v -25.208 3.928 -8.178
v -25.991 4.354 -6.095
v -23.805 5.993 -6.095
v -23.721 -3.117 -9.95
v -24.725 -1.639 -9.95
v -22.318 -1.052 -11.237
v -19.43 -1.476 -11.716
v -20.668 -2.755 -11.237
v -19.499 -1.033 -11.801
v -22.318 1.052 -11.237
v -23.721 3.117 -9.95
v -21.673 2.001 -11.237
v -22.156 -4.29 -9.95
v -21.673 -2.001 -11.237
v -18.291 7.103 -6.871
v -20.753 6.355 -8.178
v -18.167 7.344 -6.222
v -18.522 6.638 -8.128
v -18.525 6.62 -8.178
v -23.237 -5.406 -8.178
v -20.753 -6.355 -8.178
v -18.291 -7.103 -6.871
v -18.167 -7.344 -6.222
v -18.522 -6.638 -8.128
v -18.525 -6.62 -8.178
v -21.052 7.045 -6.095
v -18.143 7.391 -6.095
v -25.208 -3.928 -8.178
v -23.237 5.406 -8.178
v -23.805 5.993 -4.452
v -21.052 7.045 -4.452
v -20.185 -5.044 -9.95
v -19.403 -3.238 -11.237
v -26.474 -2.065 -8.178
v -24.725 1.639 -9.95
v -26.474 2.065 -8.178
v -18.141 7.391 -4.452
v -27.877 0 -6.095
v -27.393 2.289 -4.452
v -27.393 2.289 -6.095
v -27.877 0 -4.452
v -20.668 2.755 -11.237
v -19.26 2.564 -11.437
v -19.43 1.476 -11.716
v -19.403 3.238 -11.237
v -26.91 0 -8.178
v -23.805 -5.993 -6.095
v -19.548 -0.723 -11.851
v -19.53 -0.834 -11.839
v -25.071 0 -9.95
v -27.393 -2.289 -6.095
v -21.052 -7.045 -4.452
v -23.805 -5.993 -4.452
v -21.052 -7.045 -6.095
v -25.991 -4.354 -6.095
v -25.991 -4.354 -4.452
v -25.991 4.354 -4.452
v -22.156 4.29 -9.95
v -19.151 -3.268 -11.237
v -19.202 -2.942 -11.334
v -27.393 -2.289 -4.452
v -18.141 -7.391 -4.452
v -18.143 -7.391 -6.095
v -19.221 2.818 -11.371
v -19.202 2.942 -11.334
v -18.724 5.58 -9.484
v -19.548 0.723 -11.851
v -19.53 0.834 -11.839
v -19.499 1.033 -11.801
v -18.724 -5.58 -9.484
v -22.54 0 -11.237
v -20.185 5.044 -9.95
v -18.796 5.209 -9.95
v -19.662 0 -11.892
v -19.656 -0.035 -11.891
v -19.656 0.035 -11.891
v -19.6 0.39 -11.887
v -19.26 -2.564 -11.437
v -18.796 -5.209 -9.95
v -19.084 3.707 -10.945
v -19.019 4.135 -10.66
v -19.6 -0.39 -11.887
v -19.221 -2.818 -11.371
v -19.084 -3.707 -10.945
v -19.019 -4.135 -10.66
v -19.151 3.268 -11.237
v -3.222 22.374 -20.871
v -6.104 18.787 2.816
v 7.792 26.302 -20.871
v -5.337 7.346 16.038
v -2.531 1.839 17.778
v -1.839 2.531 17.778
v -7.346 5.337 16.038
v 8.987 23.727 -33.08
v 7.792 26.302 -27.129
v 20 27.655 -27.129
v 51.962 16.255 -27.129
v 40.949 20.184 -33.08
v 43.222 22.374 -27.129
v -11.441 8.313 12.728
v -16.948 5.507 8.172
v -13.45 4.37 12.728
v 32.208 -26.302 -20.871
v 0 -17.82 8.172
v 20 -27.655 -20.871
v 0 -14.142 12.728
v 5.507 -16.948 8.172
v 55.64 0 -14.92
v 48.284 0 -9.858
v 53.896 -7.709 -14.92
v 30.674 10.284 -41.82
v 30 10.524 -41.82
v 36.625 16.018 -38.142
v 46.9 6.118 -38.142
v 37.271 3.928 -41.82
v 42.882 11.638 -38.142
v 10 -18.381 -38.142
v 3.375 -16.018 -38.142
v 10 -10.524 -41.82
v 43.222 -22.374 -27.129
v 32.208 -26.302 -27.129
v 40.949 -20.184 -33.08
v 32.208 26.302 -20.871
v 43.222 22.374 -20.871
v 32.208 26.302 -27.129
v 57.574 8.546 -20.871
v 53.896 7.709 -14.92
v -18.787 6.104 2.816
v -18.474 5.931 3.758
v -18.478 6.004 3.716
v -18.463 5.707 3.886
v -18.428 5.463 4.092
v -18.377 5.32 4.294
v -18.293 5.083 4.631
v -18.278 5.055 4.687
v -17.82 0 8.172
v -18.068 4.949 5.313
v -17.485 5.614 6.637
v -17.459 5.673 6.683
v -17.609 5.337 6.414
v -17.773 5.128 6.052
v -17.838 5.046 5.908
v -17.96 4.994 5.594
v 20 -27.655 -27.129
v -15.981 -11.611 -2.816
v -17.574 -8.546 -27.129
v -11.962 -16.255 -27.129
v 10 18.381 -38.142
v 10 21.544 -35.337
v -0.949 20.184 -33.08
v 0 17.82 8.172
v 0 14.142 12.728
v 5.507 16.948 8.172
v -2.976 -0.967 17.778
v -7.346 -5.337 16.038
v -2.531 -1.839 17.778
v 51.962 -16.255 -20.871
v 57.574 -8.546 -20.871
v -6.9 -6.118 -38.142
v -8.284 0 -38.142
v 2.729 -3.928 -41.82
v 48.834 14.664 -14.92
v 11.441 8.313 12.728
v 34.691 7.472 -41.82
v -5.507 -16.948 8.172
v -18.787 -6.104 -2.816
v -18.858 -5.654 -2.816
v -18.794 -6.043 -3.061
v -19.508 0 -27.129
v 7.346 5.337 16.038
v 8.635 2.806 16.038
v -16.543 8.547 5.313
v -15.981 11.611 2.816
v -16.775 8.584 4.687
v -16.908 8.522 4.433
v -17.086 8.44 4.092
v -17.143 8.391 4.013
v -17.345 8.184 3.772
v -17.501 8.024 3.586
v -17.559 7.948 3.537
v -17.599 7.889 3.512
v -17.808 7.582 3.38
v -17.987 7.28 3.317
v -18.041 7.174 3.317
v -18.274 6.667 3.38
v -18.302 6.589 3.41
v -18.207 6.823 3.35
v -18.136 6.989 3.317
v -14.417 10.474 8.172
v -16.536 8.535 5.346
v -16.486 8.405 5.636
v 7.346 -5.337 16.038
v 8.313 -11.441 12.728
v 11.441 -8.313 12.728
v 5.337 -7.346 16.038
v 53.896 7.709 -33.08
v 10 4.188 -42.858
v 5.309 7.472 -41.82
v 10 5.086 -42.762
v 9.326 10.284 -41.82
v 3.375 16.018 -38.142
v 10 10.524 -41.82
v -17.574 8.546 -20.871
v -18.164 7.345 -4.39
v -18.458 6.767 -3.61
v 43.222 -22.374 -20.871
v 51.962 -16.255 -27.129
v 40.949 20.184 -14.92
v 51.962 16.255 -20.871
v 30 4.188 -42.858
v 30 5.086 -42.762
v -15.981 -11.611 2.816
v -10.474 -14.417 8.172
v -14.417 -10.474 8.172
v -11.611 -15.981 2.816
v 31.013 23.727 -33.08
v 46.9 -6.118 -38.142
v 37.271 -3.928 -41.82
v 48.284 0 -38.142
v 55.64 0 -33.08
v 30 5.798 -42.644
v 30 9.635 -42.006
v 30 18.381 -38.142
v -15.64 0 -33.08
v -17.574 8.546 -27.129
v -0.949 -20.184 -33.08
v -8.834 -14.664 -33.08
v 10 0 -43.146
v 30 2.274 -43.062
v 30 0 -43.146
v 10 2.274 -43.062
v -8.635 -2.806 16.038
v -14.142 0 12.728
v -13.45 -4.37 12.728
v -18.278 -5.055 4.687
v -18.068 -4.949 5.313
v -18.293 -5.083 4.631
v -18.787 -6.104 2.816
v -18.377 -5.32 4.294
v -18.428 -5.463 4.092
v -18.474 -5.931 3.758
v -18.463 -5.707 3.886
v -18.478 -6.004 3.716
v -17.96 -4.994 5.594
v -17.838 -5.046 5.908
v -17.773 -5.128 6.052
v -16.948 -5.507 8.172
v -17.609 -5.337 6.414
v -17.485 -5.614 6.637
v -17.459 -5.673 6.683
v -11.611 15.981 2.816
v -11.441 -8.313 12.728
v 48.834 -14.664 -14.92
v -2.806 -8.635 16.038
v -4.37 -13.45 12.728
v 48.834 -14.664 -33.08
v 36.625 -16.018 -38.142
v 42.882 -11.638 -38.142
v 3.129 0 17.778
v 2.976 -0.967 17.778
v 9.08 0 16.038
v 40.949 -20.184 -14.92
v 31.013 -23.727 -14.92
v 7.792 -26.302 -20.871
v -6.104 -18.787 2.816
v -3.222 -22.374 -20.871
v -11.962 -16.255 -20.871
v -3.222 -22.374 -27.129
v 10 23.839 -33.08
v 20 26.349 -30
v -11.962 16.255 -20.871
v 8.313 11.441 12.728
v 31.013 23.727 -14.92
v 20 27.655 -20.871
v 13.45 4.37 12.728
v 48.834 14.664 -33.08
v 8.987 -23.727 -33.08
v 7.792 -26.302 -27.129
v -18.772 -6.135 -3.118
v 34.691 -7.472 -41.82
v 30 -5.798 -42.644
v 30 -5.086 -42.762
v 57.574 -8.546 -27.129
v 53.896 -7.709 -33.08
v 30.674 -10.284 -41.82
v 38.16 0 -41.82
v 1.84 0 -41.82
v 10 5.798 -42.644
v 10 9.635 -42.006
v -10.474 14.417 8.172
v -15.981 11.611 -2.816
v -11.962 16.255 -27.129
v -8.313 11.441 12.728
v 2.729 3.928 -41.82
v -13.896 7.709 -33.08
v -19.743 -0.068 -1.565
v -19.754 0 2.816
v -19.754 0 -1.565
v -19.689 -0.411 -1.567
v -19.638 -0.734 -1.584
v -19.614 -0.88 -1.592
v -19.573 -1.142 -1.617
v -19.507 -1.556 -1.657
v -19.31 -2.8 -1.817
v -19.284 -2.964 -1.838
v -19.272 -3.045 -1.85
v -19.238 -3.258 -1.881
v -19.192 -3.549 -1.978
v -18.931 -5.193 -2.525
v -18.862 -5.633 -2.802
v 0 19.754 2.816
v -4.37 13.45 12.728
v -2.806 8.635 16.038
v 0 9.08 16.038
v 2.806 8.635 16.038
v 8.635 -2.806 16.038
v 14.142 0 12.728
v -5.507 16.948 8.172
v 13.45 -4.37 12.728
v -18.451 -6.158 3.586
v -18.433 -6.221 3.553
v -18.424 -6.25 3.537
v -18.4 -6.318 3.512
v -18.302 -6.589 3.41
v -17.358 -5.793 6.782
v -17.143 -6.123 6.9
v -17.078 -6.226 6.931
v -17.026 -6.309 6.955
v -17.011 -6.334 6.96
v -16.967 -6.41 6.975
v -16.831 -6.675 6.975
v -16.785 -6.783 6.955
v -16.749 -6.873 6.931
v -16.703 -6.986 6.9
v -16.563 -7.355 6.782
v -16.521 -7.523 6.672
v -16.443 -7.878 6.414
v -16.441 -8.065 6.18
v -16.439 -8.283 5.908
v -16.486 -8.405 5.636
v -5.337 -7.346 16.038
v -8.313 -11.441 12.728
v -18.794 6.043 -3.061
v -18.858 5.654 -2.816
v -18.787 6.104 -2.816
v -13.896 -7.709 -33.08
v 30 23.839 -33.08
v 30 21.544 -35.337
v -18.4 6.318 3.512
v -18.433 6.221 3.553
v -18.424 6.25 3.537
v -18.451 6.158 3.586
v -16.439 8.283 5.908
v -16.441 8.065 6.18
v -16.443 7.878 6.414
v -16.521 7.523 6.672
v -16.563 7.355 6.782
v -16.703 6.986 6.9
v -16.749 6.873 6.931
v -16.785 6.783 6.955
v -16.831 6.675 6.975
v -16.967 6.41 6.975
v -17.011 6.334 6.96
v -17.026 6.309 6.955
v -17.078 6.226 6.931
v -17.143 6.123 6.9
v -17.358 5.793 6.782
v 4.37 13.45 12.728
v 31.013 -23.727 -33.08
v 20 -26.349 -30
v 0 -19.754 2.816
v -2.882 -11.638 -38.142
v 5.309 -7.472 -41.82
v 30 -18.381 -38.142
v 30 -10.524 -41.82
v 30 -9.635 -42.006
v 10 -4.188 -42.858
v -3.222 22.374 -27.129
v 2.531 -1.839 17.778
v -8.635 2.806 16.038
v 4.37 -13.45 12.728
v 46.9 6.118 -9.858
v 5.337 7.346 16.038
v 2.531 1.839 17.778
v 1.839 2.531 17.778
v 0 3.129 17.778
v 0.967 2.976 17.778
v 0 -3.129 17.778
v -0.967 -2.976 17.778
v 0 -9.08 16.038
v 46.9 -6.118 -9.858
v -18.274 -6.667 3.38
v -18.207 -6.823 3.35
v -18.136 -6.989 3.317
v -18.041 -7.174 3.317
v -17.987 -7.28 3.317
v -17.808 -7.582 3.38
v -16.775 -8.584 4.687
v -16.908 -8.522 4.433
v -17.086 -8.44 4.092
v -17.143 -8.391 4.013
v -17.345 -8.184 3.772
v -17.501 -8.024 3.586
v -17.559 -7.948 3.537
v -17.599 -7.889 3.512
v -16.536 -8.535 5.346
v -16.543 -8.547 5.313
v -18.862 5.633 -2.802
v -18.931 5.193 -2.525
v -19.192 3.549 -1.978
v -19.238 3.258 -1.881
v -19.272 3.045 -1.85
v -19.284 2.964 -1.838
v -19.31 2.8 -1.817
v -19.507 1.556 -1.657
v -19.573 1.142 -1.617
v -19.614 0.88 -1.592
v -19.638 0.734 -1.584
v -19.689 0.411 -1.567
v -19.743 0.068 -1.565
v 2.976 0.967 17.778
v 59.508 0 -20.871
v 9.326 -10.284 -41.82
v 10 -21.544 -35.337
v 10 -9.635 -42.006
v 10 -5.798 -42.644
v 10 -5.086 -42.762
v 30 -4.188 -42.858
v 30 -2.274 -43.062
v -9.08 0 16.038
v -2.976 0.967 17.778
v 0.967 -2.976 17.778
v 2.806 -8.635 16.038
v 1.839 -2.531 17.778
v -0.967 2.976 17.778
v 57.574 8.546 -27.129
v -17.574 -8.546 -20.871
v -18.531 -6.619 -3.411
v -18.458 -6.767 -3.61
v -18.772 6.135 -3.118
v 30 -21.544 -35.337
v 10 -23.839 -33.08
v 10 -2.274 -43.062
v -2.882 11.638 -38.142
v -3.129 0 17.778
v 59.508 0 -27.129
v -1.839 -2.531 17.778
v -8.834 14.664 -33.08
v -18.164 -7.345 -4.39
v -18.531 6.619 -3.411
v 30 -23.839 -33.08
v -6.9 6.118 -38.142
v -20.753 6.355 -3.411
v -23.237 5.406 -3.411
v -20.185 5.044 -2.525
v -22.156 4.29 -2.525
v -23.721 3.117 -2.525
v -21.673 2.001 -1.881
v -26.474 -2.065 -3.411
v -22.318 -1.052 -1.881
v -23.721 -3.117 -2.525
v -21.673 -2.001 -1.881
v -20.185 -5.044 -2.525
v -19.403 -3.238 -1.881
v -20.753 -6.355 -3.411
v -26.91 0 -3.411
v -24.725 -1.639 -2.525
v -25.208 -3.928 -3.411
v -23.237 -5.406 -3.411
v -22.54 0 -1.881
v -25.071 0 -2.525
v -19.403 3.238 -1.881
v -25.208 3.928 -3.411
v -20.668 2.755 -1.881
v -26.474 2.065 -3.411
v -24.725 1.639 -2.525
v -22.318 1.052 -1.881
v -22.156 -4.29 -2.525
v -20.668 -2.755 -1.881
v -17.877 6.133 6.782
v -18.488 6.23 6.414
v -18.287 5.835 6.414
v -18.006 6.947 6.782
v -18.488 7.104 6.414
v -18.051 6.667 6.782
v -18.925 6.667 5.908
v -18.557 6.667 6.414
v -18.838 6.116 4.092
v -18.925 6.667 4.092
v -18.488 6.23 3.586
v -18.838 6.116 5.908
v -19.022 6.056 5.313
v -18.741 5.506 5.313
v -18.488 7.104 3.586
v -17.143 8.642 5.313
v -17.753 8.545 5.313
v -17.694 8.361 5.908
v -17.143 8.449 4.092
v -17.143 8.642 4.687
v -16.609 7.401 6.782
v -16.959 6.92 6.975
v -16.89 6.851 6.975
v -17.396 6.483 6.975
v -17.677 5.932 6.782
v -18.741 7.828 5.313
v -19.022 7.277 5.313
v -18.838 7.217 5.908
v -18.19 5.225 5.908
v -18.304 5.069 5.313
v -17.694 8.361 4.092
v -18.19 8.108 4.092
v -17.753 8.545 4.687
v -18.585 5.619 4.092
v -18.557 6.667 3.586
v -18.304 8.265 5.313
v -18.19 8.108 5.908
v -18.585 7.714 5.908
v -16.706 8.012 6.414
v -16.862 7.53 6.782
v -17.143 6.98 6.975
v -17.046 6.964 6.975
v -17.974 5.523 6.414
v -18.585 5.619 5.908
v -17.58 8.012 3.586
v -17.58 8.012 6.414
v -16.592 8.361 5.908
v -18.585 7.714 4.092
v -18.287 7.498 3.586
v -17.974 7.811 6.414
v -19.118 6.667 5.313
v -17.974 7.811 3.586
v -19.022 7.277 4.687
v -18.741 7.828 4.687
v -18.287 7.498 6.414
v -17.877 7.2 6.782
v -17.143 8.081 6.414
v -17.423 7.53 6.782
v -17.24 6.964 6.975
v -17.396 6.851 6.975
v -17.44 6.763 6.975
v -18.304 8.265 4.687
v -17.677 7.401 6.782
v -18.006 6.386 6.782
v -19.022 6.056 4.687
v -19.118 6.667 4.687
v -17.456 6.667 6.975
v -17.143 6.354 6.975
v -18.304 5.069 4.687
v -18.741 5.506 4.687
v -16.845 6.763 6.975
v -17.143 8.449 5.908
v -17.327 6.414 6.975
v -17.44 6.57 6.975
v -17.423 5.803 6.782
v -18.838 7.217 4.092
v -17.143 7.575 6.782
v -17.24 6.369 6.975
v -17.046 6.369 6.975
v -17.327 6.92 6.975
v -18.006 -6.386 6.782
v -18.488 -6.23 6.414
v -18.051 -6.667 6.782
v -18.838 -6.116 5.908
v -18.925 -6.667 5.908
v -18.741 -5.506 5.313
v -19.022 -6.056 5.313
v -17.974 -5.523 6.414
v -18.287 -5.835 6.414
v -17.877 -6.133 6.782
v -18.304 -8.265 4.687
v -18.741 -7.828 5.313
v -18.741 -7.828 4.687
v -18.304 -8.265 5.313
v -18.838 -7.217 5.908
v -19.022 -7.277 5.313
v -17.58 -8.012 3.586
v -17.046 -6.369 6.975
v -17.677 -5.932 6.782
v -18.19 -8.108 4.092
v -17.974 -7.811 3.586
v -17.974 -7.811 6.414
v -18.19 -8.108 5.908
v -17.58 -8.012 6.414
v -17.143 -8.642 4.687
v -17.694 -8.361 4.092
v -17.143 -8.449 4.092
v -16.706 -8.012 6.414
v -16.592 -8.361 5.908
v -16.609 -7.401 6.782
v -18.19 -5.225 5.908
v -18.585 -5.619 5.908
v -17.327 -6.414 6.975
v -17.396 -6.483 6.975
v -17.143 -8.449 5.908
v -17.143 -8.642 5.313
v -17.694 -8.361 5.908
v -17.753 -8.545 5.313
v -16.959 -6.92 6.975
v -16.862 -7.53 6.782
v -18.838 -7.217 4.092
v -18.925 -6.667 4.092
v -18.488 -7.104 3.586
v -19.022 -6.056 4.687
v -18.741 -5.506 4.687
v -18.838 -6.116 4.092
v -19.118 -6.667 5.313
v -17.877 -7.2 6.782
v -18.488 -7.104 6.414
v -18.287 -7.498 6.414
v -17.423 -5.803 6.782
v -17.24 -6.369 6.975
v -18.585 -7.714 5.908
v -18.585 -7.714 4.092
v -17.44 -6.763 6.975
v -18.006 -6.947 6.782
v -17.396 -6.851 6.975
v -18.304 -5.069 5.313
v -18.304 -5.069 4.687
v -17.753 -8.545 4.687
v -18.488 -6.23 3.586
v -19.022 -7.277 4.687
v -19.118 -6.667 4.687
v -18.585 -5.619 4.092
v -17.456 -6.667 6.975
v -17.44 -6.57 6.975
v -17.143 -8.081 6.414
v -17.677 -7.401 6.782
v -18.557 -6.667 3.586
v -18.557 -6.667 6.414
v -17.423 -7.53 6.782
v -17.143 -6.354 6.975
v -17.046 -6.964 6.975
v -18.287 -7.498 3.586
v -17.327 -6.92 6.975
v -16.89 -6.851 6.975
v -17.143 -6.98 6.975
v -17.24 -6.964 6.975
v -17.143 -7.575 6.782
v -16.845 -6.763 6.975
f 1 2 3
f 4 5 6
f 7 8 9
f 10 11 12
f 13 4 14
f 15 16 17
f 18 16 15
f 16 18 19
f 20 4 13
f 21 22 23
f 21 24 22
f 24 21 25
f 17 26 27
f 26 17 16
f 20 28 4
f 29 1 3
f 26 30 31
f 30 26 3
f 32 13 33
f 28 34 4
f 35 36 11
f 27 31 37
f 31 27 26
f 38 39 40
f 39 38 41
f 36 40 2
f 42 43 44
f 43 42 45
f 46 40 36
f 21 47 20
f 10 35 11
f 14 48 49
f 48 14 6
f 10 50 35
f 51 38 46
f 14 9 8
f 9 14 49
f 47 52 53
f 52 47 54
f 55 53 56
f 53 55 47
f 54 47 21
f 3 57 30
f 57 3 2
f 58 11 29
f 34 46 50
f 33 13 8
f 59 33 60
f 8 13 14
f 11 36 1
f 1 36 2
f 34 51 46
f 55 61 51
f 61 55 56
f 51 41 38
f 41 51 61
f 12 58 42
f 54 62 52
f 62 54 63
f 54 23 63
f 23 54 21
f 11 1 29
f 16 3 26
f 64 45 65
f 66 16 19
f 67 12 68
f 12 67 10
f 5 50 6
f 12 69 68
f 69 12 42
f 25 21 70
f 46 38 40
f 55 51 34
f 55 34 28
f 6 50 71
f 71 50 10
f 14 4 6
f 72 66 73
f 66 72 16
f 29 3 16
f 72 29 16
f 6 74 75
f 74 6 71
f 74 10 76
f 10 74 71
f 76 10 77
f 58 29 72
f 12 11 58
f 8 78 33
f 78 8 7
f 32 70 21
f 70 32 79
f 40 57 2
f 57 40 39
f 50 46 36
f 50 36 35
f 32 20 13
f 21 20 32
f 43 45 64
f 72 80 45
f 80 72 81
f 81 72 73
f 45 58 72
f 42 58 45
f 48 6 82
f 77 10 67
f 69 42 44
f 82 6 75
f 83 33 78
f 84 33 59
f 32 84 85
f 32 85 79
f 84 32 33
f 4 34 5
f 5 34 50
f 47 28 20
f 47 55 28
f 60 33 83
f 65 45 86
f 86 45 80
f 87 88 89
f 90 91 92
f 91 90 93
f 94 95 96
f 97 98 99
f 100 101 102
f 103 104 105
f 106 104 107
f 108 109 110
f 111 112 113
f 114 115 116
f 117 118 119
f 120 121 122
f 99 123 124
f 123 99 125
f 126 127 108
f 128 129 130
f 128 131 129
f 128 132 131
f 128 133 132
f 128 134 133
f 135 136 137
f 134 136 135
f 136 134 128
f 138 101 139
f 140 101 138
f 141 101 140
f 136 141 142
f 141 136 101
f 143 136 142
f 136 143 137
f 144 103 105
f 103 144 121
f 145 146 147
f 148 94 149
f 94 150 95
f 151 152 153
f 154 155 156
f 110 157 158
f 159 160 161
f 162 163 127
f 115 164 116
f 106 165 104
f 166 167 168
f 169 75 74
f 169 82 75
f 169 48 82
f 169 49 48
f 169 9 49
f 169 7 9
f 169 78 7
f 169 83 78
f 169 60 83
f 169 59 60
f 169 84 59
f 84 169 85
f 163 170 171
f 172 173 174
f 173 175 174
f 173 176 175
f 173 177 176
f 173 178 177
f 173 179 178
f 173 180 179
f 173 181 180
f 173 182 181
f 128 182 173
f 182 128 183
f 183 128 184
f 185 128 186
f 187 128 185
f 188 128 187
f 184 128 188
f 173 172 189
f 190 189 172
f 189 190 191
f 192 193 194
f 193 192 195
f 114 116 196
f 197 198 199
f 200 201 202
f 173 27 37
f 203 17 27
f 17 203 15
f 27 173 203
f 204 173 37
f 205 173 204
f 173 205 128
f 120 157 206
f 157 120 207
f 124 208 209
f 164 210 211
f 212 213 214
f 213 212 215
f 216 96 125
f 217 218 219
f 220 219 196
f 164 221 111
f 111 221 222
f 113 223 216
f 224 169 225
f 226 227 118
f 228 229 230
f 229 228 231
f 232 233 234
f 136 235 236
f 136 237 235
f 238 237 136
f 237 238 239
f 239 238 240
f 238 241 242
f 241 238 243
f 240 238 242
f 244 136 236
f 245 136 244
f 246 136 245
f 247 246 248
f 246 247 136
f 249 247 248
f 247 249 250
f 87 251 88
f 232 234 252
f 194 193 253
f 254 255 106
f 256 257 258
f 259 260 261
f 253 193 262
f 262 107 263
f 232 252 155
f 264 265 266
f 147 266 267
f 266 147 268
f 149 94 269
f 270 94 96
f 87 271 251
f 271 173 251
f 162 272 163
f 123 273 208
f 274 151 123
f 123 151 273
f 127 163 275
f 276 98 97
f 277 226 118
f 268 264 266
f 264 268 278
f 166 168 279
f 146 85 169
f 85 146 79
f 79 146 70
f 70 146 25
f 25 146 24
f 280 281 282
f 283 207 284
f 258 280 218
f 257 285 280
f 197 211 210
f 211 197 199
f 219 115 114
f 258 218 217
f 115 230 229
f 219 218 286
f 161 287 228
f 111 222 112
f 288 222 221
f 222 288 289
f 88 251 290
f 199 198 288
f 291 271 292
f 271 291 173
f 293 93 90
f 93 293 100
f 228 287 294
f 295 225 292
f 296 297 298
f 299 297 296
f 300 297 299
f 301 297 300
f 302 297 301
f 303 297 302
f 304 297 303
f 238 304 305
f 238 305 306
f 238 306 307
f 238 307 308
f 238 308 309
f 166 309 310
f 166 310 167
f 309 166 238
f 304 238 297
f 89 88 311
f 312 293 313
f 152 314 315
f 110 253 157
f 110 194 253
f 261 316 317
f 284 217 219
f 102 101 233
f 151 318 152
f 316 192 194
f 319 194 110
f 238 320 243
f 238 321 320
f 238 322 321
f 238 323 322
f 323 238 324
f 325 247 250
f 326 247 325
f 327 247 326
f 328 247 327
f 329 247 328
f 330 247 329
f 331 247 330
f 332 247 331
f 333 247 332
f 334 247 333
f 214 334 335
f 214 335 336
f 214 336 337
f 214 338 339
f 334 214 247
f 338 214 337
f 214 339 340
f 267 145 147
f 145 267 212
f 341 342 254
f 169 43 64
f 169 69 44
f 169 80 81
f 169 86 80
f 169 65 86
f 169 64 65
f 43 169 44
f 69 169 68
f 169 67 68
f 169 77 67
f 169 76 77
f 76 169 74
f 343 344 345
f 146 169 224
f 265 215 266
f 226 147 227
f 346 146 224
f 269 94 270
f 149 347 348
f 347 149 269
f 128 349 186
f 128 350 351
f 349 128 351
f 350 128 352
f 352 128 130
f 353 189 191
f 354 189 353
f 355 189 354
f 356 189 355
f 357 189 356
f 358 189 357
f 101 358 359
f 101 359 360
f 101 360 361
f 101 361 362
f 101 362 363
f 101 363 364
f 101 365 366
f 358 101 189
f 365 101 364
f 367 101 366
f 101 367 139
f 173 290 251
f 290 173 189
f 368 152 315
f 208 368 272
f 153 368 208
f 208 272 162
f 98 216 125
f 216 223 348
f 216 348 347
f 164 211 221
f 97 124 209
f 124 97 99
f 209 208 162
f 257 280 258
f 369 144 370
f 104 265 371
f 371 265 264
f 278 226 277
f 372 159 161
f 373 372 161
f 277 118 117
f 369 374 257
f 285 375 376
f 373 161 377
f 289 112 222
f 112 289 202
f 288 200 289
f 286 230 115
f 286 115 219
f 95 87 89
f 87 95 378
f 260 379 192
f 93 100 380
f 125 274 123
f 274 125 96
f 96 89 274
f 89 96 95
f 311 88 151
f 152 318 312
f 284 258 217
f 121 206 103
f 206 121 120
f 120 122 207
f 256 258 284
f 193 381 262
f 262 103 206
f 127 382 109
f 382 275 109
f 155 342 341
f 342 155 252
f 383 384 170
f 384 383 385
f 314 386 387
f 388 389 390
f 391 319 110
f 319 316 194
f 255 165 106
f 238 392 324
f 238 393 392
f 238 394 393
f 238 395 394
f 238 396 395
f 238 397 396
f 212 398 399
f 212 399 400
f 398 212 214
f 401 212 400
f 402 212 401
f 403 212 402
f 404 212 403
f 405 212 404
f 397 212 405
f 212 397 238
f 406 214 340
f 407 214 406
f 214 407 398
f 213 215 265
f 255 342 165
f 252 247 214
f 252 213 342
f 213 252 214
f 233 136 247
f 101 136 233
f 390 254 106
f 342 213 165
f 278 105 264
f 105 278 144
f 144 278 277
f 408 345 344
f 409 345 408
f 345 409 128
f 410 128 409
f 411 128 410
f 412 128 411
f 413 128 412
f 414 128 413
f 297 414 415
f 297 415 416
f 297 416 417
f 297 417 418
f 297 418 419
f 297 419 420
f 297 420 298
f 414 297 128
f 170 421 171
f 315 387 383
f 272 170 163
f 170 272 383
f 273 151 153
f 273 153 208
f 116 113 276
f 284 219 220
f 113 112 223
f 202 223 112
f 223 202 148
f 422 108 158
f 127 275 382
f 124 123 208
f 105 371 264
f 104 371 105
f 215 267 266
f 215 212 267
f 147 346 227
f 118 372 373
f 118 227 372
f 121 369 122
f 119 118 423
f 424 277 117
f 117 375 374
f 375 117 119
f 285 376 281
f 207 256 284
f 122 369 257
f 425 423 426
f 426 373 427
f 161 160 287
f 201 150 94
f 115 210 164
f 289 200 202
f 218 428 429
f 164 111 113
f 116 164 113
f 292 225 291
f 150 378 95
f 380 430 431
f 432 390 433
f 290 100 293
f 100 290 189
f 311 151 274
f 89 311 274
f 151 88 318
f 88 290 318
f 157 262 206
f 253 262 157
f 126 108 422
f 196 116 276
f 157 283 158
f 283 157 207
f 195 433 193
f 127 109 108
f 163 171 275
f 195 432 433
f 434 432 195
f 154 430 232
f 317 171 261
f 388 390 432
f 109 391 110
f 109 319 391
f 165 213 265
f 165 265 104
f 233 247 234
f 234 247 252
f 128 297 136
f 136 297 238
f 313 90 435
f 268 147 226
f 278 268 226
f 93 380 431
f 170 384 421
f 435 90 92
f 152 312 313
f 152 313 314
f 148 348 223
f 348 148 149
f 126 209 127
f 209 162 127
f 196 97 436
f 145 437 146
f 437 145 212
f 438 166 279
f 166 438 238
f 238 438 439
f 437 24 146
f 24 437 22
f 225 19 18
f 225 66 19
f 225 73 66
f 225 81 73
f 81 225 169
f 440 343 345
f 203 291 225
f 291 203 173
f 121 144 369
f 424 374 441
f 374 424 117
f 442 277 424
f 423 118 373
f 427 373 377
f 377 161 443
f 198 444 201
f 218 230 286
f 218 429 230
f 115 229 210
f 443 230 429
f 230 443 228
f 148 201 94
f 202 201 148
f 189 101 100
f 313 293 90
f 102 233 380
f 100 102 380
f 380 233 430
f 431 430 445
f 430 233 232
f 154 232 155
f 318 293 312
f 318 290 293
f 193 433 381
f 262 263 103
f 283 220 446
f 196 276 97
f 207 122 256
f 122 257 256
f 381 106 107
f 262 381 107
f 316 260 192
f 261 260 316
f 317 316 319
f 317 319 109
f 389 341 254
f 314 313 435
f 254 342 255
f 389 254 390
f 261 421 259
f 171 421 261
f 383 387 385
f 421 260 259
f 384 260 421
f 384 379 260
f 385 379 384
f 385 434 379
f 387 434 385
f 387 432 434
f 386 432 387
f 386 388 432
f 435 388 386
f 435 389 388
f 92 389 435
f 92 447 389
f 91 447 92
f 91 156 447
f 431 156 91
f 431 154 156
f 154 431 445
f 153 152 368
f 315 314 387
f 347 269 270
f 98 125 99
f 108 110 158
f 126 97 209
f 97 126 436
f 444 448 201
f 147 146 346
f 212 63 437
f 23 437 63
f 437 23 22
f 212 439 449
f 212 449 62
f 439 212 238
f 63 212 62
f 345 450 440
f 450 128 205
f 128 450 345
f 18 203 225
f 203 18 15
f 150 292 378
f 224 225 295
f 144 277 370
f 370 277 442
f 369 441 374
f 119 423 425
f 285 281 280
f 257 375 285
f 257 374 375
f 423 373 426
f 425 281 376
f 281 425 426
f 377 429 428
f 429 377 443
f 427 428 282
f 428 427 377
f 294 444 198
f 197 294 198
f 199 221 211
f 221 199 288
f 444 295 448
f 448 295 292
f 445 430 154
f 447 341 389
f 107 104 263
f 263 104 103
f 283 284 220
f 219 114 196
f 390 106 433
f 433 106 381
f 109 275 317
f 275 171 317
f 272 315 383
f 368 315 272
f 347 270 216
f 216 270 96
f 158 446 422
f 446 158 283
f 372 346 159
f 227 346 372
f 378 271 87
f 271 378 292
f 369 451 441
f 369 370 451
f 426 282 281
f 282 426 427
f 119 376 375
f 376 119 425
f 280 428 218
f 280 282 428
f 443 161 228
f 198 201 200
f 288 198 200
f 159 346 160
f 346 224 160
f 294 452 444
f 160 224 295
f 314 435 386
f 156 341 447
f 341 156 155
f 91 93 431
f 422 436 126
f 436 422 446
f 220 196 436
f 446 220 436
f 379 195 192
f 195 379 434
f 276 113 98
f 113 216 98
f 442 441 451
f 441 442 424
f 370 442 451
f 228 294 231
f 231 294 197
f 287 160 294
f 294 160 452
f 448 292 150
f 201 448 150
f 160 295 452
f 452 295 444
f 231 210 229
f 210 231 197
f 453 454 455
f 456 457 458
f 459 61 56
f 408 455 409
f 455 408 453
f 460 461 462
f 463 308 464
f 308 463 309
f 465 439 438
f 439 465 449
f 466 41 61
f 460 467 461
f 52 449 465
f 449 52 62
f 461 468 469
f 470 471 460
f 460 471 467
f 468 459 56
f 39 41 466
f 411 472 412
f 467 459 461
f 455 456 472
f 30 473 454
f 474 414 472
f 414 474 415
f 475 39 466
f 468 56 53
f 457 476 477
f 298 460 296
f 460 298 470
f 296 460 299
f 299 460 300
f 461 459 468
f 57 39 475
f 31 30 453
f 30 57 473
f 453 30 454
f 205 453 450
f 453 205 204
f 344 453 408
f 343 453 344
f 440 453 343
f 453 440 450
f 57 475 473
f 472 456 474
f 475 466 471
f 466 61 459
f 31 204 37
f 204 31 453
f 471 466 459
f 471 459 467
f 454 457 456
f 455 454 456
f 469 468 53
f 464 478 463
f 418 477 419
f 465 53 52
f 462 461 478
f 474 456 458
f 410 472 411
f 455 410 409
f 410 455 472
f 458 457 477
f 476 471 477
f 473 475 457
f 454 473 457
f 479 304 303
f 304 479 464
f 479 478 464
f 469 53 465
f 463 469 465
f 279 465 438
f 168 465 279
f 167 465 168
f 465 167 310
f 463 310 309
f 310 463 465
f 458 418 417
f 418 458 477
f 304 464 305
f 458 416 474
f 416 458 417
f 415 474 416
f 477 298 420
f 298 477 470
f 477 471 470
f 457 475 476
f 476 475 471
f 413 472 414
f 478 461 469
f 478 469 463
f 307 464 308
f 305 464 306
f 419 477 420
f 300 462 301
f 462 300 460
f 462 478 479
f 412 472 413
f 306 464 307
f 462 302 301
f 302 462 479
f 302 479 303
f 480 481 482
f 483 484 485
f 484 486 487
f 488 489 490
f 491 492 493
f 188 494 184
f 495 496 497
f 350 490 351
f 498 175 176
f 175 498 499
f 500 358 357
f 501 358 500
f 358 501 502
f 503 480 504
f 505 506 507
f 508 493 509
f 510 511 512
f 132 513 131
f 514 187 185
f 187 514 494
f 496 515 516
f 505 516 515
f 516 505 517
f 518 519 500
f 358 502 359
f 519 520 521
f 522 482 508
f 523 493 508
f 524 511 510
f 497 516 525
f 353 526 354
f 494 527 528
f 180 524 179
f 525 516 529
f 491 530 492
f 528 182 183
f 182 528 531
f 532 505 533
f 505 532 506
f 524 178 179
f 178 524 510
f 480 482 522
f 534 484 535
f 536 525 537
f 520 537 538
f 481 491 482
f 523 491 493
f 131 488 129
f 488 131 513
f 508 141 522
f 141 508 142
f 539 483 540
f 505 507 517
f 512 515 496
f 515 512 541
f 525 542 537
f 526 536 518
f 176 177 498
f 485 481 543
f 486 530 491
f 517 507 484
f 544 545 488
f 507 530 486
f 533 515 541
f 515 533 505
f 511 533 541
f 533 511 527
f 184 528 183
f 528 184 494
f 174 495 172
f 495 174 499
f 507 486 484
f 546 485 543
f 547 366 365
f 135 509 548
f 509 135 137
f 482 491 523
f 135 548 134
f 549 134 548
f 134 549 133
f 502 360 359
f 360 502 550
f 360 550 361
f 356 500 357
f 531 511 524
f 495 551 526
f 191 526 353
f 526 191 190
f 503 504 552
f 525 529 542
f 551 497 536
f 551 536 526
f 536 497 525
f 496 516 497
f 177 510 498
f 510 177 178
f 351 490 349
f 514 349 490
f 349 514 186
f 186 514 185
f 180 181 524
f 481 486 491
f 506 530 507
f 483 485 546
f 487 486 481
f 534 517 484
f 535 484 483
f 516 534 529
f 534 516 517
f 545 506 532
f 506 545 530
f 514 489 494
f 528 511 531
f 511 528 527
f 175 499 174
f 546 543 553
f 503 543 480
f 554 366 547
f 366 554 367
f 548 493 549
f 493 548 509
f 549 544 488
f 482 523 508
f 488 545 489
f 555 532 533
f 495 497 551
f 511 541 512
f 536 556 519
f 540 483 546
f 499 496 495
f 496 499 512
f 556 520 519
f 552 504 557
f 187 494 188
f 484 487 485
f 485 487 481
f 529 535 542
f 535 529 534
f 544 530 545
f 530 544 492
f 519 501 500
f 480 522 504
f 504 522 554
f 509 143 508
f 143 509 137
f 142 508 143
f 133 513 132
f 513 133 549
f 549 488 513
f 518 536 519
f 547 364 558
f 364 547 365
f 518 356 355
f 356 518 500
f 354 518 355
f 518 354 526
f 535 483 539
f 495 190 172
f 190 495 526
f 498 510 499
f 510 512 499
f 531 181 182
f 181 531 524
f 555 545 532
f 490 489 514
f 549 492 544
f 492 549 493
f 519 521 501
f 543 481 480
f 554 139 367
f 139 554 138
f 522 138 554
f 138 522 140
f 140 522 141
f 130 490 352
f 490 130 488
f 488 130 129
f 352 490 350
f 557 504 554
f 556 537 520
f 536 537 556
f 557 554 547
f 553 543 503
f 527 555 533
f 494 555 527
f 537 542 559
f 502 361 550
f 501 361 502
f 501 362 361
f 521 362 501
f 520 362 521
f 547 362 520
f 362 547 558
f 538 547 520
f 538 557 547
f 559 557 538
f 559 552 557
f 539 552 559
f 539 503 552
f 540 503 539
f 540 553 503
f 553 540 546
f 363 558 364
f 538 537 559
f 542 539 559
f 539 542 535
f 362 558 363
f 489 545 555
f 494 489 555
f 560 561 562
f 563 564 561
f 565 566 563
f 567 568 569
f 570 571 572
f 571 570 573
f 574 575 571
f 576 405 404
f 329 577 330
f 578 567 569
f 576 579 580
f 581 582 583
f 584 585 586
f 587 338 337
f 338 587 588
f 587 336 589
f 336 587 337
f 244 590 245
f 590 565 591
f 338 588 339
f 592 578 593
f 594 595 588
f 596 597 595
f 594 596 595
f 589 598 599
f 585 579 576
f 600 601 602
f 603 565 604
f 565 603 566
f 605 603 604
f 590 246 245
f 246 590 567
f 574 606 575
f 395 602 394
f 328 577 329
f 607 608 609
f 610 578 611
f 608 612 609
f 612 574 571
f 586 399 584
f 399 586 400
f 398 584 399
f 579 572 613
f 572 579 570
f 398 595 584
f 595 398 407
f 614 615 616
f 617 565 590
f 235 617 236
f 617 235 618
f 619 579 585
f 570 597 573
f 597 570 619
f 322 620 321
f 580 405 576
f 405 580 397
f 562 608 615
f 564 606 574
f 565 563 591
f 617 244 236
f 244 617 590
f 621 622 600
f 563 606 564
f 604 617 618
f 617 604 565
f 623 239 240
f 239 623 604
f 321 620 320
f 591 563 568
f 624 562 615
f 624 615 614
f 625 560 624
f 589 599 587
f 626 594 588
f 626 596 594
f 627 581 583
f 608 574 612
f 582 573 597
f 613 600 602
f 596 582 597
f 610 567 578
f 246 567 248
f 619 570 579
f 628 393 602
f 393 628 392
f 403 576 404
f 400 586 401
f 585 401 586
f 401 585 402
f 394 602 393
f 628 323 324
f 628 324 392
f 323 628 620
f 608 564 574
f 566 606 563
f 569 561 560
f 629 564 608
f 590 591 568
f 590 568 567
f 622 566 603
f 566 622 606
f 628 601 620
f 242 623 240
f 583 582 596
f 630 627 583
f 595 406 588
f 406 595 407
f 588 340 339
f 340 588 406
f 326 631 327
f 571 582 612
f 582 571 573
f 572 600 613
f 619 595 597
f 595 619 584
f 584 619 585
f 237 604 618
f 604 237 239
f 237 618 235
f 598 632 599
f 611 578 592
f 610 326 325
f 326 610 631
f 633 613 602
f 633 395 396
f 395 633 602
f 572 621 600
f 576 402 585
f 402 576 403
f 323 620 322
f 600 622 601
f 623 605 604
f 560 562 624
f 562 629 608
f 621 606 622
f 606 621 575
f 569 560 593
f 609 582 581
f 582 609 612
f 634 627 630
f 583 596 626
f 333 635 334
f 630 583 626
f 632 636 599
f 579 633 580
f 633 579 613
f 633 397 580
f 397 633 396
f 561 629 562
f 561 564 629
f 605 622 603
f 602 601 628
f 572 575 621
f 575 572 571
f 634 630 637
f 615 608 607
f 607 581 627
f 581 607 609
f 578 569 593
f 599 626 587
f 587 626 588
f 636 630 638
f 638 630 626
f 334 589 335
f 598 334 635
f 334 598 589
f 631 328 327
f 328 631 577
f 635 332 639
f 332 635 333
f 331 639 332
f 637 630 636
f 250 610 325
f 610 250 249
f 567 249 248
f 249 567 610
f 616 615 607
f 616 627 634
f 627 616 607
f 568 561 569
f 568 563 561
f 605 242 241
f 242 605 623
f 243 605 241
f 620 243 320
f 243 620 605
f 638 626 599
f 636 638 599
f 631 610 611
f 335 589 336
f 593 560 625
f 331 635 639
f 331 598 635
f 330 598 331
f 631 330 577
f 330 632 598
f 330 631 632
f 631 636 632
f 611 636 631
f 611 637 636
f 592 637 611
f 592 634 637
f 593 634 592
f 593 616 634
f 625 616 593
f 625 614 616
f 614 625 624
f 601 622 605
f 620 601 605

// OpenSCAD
head=20;
res=20;
hull() { 
    scale([1,1,.9]) sphere(head, $fn=res); //head
    translate([head,0,-head*1.2]) difference() {
        scale([2,1.4,1]) sphere (head, $fn=res); //body
        translate([0,0,-head*1-6]) cube([head,head*3,head*2], center=true); //triming
    }
}
translate([-head*.9,0,-head/4]) color("red") scale([2, 1.5,.7]) sphere(head/4, $fn=res); //beak
difference (){
    translate([-head*.9,0,-head/4]) color("red") scale([2, 1.5,1.4]) sphere(head/4, $fn=res); //beak
    translate([-head*.9,0,head/4]) cube (head, center = true);
    }
translate([-head+head/7,head/3,head/4]) color("black") sphere(head/10, $fn=res); //eye
translate([-head+head/7,-head/3,head/4]) color("black") sphere(head/10, $fn=res); //eye
